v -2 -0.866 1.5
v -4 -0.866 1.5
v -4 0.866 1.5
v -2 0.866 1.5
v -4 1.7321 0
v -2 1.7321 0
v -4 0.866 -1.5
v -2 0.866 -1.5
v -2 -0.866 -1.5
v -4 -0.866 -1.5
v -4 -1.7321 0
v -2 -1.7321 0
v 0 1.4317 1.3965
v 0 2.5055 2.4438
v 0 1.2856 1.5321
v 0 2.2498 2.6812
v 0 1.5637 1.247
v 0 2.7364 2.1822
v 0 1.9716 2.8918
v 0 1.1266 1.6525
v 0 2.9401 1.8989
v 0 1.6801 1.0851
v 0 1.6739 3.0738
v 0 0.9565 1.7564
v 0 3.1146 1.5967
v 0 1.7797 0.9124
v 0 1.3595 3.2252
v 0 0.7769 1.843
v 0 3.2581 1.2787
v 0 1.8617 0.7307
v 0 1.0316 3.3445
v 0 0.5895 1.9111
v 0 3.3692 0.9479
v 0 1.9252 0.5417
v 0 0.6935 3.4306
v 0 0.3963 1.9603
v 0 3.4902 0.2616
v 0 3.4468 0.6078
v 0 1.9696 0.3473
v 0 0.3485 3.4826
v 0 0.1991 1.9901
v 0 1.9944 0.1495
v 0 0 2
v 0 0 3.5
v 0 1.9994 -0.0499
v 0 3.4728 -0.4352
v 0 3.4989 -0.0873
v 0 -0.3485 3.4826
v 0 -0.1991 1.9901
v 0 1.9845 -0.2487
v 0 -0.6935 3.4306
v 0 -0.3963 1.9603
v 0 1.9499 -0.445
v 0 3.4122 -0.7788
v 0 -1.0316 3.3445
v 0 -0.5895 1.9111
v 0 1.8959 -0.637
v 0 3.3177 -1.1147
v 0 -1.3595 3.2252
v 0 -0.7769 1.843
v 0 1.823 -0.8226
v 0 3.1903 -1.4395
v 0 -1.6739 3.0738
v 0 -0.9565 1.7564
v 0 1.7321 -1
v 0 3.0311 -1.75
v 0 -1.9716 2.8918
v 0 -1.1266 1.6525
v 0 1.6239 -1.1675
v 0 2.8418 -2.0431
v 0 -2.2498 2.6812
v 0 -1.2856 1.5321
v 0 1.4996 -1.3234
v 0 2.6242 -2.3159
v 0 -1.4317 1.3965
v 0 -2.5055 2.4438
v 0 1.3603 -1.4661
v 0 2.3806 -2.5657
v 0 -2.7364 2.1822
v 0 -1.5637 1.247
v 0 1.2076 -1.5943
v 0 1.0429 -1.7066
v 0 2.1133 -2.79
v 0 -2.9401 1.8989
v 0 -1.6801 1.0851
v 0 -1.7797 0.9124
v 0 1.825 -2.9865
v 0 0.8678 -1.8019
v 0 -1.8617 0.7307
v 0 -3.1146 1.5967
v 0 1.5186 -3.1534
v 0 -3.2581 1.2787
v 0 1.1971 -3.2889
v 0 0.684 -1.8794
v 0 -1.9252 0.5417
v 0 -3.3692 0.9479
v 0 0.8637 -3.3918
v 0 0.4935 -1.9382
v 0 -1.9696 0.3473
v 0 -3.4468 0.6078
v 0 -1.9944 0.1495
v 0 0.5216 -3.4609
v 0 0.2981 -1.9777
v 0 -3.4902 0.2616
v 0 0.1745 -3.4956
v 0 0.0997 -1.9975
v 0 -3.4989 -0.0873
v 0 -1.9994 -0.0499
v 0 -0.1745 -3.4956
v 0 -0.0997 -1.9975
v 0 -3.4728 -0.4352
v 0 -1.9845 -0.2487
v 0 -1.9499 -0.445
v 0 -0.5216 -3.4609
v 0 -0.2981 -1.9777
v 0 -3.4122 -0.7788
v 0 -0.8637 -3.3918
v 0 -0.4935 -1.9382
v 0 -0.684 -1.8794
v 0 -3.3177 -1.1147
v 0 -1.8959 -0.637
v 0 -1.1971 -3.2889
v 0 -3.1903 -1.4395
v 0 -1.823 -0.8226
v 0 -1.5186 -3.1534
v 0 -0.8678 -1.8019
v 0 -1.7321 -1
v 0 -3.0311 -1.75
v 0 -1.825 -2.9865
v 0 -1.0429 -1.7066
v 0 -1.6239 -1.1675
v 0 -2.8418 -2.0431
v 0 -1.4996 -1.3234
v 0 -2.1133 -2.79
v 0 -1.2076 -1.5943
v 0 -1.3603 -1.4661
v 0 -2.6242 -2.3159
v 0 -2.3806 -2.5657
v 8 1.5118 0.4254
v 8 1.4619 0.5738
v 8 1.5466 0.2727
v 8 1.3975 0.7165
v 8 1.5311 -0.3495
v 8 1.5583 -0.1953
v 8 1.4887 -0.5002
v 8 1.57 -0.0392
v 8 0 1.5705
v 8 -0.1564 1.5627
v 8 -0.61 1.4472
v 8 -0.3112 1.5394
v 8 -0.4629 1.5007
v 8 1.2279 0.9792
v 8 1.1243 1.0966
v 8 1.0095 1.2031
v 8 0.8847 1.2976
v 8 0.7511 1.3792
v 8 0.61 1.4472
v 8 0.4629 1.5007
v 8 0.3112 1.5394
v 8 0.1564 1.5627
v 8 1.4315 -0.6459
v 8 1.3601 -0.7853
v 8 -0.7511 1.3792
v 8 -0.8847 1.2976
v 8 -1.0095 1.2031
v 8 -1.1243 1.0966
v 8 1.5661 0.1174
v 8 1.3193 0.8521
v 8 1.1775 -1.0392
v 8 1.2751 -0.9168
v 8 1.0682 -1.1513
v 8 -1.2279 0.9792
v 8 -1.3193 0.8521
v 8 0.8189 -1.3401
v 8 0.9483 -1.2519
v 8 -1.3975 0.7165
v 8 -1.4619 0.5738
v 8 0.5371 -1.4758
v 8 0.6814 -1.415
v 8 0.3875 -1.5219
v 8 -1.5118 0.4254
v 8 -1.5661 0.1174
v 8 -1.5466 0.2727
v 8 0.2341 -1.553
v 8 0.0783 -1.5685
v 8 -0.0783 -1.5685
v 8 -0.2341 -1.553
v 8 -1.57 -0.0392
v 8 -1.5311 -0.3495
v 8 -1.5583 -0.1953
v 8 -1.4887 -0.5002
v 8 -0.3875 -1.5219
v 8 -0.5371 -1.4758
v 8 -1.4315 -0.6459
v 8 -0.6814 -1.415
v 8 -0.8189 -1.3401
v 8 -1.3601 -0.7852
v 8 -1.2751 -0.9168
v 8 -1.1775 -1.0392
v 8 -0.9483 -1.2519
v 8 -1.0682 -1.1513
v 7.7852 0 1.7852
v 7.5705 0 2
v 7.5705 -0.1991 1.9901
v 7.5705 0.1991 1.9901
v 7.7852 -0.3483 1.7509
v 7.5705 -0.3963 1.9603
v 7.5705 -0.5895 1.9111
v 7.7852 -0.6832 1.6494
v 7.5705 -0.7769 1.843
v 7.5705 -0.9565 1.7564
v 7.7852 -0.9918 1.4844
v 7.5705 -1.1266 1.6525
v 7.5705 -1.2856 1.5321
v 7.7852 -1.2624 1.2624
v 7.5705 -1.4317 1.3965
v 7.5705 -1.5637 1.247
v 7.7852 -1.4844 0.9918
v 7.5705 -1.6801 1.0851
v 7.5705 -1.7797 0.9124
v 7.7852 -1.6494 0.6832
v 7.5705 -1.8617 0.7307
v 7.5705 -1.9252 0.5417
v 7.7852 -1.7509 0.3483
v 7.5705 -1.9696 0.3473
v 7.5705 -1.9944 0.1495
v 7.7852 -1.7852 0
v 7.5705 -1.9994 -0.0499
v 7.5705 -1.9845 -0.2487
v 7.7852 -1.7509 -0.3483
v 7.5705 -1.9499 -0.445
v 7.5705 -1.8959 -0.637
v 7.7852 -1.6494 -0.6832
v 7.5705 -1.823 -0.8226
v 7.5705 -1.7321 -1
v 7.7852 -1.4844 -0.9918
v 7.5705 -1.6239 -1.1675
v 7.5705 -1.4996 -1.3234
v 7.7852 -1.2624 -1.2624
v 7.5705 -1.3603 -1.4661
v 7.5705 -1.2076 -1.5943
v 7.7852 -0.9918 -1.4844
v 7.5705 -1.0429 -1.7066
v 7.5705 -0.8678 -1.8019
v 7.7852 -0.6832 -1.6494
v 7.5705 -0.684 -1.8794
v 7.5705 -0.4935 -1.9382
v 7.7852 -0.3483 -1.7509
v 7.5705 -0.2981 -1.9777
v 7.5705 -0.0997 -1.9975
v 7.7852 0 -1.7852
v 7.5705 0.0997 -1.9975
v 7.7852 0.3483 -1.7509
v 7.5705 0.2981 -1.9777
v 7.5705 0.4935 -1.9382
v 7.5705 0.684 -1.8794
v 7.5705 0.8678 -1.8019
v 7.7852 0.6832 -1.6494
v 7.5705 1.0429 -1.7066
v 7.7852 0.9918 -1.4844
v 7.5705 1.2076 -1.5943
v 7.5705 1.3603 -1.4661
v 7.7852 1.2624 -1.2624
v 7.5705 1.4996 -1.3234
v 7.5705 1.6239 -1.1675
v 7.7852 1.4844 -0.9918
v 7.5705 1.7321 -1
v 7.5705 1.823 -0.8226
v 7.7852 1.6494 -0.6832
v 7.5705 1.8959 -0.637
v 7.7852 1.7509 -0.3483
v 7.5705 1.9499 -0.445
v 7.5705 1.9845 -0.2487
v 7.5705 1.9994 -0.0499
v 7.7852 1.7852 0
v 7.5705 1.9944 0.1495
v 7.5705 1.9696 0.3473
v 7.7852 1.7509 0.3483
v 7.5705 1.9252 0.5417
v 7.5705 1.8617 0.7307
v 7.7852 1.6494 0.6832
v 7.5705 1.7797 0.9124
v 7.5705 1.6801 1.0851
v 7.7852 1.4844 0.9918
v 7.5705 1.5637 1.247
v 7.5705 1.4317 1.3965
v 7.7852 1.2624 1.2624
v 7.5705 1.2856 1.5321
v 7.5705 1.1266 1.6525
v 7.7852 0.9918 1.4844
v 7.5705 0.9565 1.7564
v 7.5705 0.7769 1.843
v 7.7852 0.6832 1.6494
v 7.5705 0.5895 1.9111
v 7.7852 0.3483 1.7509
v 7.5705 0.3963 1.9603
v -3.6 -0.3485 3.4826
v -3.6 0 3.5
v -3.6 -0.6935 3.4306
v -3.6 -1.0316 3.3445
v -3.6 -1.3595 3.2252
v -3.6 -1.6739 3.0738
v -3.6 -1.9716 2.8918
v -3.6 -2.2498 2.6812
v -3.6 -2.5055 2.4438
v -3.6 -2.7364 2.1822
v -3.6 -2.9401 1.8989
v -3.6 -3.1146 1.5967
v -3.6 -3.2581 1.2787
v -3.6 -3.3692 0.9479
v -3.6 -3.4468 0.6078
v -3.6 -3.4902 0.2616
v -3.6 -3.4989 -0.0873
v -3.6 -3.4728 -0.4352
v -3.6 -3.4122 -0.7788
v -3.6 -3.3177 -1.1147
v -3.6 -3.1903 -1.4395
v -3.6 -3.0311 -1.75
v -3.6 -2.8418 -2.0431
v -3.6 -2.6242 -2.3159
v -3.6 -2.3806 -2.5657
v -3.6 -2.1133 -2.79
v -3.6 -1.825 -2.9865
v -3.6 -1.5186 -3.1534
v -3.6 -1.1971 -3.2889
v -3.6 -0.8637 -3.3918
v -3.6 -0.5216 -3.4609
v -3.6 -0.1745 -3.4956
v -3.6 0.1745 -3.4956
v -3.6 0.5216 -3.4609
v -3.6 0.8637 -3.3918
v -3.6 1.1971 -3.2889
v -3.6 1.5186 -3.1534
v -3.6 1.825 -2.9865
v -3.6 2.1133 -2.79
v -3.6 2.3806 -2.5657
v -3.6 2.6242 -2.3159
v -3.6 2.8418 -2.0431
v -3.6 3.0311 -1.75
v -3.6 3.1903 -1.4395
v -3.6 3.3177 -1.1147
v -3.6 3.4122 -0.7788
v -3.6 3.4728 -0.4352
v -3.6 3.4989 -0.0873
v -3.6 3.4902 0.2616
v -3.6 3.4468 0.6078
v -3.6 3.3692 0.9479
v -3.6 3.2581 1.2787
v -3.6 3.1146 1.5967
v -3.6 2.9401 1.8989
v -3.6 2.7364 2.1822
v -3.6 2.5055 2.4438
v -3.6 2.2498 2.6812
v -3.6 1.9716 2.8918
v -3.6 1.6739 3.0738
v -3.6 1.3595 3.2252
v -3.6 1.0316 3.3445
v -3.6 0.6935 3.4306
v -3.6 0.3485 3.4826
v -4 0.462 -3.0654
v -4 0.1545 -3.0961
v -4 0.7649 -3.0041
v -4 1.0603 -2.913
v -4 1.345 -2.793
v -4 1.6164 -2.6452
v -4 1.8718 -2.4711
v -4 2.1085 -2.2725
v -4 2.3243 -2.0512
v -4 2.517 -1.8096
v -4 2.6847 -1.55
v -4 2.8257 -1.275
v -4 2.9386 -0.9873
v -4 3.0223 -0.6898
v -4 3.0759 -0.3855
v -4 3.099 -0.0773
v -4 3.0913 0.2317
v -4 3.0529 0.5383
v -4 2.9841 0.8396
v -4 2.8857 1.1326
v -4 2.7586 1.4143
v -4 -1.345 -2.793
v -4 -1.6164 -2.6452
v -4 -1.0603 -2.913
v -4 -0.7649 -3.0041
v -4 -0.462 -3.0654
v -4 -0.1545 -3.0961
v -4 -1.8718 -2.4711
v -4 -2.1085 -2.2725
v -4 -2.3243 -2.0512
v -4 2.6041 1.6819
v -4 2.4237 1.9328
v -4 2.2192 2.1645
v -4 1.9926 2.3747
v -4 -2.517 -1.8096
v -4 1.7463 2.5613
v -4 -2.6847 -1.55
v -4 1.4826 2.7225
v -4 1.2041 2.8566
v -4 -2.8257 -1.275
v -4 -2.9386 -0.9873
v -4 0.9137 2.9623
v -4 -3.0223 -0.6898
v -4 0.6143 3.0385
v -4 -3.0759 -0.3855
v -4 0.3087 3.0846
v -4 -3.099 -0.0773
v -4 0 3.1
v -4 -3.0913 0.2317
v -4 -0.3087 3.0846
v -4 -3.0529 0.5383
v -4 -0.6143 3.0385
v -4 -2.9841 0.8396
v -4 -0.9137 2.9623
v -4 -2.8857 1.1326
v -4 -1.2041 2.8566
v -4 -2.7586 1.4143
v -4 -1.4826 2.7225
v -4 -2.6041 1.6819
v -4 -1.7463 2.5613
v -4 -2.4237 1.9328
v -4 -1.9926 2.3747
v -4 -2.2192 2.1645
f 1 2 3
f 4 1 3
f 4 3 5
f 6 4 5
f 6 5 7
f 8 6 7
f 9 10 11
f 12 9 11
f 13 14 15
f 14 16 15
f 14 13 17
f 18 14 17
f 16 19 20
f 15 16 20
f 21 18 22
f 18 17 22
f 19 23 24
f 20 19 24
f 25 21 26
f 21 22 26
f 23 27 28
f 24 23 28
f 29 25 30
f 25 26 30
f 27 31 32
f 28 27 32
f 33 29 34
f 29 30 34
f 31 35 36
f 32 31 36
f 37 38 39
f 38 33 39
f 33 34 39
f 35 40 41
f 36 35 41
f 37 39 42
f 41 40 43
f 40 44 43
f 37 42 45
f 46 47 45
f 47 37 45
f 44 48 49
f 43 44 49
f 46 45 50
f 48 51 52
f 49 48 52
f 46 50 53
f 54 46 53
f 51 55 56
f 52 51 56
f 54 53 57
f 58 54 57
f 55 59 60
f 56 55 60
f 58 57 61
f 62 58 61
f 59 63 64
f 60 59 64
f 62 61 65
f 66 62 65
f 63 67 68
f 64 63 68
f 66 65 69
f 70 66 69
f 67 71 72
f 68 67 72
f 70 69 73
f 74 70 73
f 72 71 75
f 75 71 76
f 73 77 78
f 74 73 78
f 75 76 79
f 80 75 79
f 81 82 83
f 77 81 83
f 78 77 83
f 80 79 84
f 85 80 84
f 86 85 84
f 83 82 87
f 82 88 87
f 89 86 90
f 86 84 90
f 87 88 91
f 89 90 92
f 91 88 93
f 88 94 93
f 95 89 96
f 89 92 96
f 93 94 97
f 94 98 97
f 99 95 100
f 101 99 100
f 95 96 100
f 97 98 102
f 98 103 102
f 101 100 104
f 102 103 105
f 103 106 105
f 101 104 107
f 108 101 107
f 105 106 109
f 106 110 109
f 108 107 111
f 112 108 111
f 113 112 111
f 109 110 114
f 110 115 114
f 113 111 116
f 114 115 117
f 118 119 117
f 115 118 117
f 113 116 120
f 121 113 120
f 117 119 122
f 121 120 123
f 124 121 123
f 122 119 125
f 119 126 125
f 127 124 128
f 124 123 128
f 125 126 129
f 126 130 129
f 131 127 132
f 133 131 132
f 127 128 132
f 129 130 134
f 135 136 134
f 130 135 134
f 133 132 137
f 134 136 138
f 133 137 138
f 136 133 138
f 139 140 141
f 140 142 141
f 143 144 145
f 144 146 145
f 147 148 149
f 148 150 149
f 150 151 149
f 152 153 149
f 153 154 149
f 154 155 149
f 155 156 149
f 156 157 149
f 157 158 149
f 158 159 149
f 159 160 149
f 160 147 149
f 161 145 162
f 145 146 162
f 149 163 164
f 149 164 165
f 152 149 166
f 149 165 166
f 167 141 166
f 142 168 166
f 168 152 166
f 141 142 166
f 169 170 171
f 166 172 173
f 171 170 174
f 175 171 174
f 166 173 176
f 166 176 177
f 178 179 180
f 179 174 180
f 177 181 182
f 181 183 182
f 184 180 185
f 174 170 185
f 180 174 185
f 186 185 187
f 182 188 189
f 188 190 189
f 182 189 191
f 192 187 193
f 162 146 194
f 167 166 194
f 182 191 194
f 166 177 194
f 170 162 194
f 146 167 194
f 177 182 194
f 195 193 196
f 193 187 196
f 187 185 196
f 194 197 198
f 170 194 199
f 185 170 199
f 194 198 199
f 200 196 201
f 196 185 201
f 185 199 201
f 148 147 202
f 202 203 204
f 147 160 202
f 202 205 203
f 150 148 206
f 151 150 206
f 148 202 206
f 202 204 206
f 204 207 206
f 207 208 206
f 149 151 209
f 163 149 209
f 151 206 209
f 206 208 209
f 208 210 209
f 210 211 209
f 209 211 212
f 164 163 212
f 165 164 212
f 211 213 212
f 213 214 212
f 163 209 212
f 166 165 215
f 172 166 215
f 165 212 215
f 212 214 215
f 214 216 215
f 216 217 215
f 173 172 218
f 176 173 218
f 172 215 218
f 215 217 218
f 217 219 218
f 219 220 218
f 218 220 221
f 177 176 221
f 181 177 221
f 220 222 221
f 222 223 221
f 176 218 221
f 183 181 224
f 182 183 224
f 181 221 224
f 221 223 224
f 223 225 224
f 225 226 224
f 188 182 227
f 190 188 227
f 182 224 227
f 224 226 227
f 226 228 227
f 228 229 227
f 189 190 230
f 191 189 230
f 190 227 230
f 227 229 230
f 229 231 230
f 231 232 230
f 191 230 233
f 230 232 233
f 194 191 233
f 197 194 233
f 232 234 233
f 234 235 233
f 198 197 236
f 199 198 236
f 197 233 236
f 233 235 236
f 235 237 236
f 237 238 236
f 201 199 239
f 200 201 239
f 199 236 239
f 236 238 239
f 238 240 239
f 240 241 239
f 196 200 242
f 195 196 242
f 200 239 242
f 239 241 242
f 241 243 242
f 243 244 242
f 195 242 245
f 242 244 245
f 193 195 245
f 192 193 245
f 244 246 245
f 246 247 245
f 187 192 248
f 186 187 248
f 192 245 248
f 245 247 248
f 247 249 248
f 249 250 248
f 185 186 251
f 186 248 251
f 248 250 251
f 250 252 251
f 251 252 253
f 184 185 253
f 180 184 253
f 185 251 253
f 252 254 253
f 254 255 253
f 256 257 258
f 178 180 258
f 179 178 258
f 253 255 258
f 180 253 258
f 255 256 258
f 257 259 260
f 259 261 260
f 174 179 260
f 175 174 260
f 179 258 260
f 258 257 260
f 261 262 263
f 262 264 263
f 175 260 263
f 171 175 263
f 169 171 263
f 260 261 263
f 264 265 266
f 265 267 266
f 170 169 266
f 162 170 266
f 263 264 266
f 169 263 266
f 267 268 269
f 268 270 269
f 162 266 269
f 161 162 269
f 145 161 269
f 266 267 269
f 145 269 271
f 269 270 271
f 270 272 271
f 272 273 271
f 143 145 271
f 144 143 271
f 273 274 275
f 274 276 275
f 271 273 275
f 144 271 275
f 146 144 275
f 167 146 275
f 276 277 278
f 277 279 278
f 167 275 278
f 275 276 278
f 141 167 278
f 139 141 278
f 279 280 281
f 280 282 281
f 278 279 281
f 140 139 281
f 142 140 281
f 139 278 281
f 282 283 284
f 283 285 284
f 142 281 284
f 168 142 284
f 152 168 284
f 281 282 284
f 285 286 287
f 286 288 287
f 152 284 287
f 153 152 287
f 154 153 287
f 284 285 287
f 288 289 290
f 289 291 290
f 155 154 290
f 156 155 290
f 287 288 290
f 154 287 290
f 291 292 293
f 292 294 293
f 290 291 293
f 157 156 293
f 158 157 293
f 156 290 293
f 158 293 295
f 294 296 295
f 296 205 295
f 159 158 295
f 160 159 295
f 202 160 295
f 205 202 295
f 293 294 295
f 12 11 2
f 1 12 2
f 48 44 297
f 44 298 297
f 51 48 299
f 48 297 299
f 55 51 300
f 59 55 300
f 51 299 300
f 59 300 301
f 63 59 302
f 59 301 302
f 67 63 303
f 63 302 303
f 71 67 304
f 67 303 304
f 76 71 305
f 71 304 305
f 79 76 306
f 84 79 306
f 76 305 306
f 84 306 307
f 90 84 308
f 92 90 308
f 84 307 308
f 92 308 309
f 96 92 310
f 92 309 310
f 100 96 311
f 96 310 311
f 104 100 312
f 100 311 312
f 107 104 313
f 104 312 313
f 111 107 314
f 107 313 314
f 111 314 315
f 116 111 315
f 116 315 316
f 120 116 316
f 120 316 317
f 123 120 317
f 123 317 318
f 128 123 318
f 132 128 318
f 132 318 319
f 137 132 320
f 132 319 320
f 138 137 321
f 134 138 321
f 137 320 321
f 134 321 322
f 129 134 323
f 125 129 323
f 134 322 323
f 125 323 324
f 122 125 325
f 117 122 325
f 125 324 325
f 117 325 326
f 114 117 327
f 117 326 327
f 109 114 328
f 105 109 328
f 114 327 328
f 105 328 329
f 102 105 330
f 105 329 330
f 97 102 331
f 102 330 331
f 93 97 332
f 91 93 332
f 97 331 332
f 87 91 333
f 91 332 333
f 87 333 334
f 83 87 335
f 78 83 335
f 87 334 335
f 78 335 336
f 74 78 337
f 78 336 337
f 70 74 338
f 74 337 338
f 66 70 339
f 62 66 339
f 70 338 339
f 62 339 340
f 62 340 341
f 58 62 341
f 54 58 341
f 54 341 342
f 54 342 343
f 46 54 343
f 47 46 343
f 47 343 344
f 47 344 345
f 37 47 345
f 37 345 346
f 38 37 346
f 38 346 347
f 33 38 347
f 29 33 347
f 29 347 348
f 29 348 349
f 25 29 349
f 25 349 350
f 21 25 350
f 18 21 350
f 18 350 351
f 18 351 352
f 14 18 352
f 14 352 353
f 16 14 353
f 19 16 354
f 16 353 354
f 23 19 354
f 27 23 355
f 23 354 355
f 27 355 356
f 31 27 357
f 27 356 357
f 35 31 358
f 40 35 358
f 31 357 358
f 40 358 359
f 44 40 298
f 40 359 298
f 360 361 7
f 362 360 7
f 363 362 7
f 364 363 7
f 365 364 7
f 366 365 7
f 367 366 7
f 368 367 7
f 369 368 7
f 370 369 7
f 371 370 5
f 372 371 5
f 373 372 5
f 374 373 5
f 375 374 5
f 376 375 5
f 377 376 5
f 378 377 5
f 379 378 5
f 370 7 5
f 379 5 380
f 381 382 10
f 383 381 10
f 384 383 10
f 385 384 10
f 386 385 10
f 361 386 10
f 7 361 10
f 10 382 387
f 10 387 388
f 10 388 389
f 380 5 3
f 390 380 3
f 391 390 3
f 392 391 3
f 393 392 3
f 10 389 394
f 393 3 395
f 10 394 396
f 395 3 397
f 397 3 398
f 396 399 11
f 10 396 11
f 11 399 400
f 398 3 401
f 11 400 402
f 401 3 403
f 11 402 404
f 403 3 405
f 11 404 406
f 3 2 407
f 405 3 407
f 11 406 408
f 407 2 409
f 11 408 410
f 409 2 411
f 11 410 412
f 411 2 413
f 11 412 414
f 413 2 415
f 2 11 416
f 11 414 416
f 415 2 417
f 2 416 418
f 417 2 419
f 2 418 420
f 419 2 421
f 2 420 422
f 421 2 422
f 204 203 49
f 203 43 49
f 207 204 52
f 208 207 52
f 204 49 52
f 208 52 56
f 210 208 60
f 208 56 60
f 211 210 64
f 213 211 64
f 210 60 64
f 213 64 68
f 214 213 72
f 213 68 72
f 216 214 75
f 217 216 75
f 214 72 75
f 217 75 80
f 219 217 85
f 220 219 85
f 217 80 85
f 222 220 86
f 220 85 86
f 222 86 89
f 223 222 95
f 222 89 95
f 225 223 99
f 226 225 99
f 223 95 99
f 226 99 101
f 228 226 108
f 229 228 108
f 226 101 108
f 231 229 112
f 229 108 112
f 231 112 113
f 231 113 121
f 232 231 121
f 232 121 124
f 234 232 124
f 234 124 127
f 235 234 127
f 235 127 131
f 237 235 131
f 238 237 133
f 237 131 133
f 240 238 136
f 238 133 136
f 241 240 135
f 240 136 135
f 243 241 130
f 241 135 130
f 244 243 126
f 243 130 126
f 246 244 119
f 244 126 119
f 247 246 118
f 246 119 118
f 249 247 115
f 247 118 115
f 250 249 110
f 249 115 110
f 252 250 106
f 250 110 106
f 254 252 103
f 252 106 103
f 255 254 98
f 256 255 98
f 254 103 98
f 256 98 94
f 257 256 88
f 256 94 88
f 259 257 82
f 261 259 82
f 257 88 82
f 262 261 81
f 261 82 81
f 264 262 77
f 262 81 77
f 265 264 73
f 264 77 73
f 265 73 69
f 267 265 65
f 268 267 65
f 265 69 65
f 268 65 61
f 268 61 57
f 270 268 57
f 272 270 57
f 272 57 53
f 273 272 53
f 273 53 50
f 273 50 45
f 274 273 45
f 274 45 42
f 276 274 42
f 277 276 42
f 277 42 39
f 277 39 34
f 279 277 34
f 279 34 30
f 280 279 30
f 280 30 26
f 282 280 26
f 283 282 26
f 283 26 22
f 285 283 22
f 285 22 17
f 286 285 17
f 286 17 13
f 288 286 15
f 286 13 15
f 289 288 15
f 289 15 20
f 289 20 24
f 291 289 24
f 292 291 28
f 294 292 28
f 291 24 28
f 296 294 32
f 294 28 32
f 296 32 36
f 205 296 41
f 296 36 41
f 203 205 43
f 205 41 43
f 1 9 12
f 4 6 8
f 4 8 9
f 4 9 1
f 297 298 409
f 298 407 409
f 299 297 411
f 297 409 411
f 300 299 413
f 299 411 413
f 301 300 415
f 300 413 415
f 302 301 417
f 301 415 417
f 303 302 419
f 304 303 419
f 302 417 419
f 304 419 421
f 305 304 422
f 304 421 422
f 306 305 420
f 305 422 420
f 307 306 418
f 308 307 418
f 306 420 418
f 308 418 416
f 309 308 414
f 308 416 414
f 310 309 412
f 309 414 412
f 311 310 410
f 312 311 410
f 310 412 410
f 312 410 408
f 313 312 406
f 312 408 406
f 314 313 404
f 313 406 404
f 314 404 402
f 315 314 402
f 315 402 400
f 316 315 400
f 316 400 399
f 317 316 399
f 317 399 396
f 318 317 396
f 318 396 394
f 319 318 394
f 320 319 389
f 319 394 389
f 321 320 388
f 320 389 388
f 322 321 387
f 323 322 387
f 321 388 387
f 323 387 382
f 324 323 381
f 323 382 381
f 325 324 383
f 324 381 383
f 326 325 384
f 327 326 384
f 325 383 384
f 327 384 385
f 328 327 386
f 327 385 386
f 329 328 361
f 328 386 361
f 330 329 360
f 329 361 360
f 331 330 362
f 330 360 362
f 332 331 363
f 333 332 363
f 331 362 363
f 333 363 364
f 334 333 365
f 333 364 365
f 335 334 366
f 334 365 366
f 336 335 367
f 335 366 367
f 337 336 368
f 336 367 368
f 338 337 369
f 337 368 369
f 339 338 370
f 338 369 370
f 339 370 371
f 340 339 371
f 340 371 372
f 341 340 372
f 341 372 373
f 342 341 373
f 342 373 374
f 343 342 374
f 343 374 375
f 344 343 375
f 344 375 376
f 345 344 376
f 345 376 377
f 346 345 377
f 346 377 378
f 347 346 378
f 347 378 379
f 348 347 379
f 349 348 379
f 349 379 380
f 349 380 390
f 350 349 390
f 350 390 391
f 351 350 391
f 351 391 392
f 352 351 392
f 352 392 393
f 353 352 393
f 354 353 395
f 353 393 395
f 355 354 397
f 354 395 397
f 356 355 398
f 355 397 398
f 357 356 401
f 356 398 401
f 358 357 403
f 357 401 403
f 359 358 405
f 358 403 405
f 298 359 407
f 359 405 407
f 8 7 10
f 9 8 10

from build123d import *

# Parameters (mm, degrees)
CUT_EXTRUDE1_DEPTH = 2


with BuildPart() as part:
    # Sketch1 → Revolve1 (revolve)
    with BuildSketch(Plane.XY):
        Polygon((-4, 0), (8, 0), (8, -1.5705), (7.5705, -2), (0, -2), (0, -3.5), (-3.6, -3.5), (-4, -3.1), align=None)
    revolve(axis=Axis((-4.6, 0, 0), (1, 0, 0)))

    # Sketch2 → Cut-Extrude1 (cut)
    with BuildSketch(Plane.ZY.offset(4)):
        Polygon((0, 1.732050808), (-1.5, 0.866025404), (-1.5, -0.866025404), (0, -1.732050808), (1.5, -0.866025404), (1.5, 0.866025404), align=None)
    extrude(amount=-CUT_EXTRUDE1_DEPTH, mode=Mode.SUBTRACT)


solid = part.part
